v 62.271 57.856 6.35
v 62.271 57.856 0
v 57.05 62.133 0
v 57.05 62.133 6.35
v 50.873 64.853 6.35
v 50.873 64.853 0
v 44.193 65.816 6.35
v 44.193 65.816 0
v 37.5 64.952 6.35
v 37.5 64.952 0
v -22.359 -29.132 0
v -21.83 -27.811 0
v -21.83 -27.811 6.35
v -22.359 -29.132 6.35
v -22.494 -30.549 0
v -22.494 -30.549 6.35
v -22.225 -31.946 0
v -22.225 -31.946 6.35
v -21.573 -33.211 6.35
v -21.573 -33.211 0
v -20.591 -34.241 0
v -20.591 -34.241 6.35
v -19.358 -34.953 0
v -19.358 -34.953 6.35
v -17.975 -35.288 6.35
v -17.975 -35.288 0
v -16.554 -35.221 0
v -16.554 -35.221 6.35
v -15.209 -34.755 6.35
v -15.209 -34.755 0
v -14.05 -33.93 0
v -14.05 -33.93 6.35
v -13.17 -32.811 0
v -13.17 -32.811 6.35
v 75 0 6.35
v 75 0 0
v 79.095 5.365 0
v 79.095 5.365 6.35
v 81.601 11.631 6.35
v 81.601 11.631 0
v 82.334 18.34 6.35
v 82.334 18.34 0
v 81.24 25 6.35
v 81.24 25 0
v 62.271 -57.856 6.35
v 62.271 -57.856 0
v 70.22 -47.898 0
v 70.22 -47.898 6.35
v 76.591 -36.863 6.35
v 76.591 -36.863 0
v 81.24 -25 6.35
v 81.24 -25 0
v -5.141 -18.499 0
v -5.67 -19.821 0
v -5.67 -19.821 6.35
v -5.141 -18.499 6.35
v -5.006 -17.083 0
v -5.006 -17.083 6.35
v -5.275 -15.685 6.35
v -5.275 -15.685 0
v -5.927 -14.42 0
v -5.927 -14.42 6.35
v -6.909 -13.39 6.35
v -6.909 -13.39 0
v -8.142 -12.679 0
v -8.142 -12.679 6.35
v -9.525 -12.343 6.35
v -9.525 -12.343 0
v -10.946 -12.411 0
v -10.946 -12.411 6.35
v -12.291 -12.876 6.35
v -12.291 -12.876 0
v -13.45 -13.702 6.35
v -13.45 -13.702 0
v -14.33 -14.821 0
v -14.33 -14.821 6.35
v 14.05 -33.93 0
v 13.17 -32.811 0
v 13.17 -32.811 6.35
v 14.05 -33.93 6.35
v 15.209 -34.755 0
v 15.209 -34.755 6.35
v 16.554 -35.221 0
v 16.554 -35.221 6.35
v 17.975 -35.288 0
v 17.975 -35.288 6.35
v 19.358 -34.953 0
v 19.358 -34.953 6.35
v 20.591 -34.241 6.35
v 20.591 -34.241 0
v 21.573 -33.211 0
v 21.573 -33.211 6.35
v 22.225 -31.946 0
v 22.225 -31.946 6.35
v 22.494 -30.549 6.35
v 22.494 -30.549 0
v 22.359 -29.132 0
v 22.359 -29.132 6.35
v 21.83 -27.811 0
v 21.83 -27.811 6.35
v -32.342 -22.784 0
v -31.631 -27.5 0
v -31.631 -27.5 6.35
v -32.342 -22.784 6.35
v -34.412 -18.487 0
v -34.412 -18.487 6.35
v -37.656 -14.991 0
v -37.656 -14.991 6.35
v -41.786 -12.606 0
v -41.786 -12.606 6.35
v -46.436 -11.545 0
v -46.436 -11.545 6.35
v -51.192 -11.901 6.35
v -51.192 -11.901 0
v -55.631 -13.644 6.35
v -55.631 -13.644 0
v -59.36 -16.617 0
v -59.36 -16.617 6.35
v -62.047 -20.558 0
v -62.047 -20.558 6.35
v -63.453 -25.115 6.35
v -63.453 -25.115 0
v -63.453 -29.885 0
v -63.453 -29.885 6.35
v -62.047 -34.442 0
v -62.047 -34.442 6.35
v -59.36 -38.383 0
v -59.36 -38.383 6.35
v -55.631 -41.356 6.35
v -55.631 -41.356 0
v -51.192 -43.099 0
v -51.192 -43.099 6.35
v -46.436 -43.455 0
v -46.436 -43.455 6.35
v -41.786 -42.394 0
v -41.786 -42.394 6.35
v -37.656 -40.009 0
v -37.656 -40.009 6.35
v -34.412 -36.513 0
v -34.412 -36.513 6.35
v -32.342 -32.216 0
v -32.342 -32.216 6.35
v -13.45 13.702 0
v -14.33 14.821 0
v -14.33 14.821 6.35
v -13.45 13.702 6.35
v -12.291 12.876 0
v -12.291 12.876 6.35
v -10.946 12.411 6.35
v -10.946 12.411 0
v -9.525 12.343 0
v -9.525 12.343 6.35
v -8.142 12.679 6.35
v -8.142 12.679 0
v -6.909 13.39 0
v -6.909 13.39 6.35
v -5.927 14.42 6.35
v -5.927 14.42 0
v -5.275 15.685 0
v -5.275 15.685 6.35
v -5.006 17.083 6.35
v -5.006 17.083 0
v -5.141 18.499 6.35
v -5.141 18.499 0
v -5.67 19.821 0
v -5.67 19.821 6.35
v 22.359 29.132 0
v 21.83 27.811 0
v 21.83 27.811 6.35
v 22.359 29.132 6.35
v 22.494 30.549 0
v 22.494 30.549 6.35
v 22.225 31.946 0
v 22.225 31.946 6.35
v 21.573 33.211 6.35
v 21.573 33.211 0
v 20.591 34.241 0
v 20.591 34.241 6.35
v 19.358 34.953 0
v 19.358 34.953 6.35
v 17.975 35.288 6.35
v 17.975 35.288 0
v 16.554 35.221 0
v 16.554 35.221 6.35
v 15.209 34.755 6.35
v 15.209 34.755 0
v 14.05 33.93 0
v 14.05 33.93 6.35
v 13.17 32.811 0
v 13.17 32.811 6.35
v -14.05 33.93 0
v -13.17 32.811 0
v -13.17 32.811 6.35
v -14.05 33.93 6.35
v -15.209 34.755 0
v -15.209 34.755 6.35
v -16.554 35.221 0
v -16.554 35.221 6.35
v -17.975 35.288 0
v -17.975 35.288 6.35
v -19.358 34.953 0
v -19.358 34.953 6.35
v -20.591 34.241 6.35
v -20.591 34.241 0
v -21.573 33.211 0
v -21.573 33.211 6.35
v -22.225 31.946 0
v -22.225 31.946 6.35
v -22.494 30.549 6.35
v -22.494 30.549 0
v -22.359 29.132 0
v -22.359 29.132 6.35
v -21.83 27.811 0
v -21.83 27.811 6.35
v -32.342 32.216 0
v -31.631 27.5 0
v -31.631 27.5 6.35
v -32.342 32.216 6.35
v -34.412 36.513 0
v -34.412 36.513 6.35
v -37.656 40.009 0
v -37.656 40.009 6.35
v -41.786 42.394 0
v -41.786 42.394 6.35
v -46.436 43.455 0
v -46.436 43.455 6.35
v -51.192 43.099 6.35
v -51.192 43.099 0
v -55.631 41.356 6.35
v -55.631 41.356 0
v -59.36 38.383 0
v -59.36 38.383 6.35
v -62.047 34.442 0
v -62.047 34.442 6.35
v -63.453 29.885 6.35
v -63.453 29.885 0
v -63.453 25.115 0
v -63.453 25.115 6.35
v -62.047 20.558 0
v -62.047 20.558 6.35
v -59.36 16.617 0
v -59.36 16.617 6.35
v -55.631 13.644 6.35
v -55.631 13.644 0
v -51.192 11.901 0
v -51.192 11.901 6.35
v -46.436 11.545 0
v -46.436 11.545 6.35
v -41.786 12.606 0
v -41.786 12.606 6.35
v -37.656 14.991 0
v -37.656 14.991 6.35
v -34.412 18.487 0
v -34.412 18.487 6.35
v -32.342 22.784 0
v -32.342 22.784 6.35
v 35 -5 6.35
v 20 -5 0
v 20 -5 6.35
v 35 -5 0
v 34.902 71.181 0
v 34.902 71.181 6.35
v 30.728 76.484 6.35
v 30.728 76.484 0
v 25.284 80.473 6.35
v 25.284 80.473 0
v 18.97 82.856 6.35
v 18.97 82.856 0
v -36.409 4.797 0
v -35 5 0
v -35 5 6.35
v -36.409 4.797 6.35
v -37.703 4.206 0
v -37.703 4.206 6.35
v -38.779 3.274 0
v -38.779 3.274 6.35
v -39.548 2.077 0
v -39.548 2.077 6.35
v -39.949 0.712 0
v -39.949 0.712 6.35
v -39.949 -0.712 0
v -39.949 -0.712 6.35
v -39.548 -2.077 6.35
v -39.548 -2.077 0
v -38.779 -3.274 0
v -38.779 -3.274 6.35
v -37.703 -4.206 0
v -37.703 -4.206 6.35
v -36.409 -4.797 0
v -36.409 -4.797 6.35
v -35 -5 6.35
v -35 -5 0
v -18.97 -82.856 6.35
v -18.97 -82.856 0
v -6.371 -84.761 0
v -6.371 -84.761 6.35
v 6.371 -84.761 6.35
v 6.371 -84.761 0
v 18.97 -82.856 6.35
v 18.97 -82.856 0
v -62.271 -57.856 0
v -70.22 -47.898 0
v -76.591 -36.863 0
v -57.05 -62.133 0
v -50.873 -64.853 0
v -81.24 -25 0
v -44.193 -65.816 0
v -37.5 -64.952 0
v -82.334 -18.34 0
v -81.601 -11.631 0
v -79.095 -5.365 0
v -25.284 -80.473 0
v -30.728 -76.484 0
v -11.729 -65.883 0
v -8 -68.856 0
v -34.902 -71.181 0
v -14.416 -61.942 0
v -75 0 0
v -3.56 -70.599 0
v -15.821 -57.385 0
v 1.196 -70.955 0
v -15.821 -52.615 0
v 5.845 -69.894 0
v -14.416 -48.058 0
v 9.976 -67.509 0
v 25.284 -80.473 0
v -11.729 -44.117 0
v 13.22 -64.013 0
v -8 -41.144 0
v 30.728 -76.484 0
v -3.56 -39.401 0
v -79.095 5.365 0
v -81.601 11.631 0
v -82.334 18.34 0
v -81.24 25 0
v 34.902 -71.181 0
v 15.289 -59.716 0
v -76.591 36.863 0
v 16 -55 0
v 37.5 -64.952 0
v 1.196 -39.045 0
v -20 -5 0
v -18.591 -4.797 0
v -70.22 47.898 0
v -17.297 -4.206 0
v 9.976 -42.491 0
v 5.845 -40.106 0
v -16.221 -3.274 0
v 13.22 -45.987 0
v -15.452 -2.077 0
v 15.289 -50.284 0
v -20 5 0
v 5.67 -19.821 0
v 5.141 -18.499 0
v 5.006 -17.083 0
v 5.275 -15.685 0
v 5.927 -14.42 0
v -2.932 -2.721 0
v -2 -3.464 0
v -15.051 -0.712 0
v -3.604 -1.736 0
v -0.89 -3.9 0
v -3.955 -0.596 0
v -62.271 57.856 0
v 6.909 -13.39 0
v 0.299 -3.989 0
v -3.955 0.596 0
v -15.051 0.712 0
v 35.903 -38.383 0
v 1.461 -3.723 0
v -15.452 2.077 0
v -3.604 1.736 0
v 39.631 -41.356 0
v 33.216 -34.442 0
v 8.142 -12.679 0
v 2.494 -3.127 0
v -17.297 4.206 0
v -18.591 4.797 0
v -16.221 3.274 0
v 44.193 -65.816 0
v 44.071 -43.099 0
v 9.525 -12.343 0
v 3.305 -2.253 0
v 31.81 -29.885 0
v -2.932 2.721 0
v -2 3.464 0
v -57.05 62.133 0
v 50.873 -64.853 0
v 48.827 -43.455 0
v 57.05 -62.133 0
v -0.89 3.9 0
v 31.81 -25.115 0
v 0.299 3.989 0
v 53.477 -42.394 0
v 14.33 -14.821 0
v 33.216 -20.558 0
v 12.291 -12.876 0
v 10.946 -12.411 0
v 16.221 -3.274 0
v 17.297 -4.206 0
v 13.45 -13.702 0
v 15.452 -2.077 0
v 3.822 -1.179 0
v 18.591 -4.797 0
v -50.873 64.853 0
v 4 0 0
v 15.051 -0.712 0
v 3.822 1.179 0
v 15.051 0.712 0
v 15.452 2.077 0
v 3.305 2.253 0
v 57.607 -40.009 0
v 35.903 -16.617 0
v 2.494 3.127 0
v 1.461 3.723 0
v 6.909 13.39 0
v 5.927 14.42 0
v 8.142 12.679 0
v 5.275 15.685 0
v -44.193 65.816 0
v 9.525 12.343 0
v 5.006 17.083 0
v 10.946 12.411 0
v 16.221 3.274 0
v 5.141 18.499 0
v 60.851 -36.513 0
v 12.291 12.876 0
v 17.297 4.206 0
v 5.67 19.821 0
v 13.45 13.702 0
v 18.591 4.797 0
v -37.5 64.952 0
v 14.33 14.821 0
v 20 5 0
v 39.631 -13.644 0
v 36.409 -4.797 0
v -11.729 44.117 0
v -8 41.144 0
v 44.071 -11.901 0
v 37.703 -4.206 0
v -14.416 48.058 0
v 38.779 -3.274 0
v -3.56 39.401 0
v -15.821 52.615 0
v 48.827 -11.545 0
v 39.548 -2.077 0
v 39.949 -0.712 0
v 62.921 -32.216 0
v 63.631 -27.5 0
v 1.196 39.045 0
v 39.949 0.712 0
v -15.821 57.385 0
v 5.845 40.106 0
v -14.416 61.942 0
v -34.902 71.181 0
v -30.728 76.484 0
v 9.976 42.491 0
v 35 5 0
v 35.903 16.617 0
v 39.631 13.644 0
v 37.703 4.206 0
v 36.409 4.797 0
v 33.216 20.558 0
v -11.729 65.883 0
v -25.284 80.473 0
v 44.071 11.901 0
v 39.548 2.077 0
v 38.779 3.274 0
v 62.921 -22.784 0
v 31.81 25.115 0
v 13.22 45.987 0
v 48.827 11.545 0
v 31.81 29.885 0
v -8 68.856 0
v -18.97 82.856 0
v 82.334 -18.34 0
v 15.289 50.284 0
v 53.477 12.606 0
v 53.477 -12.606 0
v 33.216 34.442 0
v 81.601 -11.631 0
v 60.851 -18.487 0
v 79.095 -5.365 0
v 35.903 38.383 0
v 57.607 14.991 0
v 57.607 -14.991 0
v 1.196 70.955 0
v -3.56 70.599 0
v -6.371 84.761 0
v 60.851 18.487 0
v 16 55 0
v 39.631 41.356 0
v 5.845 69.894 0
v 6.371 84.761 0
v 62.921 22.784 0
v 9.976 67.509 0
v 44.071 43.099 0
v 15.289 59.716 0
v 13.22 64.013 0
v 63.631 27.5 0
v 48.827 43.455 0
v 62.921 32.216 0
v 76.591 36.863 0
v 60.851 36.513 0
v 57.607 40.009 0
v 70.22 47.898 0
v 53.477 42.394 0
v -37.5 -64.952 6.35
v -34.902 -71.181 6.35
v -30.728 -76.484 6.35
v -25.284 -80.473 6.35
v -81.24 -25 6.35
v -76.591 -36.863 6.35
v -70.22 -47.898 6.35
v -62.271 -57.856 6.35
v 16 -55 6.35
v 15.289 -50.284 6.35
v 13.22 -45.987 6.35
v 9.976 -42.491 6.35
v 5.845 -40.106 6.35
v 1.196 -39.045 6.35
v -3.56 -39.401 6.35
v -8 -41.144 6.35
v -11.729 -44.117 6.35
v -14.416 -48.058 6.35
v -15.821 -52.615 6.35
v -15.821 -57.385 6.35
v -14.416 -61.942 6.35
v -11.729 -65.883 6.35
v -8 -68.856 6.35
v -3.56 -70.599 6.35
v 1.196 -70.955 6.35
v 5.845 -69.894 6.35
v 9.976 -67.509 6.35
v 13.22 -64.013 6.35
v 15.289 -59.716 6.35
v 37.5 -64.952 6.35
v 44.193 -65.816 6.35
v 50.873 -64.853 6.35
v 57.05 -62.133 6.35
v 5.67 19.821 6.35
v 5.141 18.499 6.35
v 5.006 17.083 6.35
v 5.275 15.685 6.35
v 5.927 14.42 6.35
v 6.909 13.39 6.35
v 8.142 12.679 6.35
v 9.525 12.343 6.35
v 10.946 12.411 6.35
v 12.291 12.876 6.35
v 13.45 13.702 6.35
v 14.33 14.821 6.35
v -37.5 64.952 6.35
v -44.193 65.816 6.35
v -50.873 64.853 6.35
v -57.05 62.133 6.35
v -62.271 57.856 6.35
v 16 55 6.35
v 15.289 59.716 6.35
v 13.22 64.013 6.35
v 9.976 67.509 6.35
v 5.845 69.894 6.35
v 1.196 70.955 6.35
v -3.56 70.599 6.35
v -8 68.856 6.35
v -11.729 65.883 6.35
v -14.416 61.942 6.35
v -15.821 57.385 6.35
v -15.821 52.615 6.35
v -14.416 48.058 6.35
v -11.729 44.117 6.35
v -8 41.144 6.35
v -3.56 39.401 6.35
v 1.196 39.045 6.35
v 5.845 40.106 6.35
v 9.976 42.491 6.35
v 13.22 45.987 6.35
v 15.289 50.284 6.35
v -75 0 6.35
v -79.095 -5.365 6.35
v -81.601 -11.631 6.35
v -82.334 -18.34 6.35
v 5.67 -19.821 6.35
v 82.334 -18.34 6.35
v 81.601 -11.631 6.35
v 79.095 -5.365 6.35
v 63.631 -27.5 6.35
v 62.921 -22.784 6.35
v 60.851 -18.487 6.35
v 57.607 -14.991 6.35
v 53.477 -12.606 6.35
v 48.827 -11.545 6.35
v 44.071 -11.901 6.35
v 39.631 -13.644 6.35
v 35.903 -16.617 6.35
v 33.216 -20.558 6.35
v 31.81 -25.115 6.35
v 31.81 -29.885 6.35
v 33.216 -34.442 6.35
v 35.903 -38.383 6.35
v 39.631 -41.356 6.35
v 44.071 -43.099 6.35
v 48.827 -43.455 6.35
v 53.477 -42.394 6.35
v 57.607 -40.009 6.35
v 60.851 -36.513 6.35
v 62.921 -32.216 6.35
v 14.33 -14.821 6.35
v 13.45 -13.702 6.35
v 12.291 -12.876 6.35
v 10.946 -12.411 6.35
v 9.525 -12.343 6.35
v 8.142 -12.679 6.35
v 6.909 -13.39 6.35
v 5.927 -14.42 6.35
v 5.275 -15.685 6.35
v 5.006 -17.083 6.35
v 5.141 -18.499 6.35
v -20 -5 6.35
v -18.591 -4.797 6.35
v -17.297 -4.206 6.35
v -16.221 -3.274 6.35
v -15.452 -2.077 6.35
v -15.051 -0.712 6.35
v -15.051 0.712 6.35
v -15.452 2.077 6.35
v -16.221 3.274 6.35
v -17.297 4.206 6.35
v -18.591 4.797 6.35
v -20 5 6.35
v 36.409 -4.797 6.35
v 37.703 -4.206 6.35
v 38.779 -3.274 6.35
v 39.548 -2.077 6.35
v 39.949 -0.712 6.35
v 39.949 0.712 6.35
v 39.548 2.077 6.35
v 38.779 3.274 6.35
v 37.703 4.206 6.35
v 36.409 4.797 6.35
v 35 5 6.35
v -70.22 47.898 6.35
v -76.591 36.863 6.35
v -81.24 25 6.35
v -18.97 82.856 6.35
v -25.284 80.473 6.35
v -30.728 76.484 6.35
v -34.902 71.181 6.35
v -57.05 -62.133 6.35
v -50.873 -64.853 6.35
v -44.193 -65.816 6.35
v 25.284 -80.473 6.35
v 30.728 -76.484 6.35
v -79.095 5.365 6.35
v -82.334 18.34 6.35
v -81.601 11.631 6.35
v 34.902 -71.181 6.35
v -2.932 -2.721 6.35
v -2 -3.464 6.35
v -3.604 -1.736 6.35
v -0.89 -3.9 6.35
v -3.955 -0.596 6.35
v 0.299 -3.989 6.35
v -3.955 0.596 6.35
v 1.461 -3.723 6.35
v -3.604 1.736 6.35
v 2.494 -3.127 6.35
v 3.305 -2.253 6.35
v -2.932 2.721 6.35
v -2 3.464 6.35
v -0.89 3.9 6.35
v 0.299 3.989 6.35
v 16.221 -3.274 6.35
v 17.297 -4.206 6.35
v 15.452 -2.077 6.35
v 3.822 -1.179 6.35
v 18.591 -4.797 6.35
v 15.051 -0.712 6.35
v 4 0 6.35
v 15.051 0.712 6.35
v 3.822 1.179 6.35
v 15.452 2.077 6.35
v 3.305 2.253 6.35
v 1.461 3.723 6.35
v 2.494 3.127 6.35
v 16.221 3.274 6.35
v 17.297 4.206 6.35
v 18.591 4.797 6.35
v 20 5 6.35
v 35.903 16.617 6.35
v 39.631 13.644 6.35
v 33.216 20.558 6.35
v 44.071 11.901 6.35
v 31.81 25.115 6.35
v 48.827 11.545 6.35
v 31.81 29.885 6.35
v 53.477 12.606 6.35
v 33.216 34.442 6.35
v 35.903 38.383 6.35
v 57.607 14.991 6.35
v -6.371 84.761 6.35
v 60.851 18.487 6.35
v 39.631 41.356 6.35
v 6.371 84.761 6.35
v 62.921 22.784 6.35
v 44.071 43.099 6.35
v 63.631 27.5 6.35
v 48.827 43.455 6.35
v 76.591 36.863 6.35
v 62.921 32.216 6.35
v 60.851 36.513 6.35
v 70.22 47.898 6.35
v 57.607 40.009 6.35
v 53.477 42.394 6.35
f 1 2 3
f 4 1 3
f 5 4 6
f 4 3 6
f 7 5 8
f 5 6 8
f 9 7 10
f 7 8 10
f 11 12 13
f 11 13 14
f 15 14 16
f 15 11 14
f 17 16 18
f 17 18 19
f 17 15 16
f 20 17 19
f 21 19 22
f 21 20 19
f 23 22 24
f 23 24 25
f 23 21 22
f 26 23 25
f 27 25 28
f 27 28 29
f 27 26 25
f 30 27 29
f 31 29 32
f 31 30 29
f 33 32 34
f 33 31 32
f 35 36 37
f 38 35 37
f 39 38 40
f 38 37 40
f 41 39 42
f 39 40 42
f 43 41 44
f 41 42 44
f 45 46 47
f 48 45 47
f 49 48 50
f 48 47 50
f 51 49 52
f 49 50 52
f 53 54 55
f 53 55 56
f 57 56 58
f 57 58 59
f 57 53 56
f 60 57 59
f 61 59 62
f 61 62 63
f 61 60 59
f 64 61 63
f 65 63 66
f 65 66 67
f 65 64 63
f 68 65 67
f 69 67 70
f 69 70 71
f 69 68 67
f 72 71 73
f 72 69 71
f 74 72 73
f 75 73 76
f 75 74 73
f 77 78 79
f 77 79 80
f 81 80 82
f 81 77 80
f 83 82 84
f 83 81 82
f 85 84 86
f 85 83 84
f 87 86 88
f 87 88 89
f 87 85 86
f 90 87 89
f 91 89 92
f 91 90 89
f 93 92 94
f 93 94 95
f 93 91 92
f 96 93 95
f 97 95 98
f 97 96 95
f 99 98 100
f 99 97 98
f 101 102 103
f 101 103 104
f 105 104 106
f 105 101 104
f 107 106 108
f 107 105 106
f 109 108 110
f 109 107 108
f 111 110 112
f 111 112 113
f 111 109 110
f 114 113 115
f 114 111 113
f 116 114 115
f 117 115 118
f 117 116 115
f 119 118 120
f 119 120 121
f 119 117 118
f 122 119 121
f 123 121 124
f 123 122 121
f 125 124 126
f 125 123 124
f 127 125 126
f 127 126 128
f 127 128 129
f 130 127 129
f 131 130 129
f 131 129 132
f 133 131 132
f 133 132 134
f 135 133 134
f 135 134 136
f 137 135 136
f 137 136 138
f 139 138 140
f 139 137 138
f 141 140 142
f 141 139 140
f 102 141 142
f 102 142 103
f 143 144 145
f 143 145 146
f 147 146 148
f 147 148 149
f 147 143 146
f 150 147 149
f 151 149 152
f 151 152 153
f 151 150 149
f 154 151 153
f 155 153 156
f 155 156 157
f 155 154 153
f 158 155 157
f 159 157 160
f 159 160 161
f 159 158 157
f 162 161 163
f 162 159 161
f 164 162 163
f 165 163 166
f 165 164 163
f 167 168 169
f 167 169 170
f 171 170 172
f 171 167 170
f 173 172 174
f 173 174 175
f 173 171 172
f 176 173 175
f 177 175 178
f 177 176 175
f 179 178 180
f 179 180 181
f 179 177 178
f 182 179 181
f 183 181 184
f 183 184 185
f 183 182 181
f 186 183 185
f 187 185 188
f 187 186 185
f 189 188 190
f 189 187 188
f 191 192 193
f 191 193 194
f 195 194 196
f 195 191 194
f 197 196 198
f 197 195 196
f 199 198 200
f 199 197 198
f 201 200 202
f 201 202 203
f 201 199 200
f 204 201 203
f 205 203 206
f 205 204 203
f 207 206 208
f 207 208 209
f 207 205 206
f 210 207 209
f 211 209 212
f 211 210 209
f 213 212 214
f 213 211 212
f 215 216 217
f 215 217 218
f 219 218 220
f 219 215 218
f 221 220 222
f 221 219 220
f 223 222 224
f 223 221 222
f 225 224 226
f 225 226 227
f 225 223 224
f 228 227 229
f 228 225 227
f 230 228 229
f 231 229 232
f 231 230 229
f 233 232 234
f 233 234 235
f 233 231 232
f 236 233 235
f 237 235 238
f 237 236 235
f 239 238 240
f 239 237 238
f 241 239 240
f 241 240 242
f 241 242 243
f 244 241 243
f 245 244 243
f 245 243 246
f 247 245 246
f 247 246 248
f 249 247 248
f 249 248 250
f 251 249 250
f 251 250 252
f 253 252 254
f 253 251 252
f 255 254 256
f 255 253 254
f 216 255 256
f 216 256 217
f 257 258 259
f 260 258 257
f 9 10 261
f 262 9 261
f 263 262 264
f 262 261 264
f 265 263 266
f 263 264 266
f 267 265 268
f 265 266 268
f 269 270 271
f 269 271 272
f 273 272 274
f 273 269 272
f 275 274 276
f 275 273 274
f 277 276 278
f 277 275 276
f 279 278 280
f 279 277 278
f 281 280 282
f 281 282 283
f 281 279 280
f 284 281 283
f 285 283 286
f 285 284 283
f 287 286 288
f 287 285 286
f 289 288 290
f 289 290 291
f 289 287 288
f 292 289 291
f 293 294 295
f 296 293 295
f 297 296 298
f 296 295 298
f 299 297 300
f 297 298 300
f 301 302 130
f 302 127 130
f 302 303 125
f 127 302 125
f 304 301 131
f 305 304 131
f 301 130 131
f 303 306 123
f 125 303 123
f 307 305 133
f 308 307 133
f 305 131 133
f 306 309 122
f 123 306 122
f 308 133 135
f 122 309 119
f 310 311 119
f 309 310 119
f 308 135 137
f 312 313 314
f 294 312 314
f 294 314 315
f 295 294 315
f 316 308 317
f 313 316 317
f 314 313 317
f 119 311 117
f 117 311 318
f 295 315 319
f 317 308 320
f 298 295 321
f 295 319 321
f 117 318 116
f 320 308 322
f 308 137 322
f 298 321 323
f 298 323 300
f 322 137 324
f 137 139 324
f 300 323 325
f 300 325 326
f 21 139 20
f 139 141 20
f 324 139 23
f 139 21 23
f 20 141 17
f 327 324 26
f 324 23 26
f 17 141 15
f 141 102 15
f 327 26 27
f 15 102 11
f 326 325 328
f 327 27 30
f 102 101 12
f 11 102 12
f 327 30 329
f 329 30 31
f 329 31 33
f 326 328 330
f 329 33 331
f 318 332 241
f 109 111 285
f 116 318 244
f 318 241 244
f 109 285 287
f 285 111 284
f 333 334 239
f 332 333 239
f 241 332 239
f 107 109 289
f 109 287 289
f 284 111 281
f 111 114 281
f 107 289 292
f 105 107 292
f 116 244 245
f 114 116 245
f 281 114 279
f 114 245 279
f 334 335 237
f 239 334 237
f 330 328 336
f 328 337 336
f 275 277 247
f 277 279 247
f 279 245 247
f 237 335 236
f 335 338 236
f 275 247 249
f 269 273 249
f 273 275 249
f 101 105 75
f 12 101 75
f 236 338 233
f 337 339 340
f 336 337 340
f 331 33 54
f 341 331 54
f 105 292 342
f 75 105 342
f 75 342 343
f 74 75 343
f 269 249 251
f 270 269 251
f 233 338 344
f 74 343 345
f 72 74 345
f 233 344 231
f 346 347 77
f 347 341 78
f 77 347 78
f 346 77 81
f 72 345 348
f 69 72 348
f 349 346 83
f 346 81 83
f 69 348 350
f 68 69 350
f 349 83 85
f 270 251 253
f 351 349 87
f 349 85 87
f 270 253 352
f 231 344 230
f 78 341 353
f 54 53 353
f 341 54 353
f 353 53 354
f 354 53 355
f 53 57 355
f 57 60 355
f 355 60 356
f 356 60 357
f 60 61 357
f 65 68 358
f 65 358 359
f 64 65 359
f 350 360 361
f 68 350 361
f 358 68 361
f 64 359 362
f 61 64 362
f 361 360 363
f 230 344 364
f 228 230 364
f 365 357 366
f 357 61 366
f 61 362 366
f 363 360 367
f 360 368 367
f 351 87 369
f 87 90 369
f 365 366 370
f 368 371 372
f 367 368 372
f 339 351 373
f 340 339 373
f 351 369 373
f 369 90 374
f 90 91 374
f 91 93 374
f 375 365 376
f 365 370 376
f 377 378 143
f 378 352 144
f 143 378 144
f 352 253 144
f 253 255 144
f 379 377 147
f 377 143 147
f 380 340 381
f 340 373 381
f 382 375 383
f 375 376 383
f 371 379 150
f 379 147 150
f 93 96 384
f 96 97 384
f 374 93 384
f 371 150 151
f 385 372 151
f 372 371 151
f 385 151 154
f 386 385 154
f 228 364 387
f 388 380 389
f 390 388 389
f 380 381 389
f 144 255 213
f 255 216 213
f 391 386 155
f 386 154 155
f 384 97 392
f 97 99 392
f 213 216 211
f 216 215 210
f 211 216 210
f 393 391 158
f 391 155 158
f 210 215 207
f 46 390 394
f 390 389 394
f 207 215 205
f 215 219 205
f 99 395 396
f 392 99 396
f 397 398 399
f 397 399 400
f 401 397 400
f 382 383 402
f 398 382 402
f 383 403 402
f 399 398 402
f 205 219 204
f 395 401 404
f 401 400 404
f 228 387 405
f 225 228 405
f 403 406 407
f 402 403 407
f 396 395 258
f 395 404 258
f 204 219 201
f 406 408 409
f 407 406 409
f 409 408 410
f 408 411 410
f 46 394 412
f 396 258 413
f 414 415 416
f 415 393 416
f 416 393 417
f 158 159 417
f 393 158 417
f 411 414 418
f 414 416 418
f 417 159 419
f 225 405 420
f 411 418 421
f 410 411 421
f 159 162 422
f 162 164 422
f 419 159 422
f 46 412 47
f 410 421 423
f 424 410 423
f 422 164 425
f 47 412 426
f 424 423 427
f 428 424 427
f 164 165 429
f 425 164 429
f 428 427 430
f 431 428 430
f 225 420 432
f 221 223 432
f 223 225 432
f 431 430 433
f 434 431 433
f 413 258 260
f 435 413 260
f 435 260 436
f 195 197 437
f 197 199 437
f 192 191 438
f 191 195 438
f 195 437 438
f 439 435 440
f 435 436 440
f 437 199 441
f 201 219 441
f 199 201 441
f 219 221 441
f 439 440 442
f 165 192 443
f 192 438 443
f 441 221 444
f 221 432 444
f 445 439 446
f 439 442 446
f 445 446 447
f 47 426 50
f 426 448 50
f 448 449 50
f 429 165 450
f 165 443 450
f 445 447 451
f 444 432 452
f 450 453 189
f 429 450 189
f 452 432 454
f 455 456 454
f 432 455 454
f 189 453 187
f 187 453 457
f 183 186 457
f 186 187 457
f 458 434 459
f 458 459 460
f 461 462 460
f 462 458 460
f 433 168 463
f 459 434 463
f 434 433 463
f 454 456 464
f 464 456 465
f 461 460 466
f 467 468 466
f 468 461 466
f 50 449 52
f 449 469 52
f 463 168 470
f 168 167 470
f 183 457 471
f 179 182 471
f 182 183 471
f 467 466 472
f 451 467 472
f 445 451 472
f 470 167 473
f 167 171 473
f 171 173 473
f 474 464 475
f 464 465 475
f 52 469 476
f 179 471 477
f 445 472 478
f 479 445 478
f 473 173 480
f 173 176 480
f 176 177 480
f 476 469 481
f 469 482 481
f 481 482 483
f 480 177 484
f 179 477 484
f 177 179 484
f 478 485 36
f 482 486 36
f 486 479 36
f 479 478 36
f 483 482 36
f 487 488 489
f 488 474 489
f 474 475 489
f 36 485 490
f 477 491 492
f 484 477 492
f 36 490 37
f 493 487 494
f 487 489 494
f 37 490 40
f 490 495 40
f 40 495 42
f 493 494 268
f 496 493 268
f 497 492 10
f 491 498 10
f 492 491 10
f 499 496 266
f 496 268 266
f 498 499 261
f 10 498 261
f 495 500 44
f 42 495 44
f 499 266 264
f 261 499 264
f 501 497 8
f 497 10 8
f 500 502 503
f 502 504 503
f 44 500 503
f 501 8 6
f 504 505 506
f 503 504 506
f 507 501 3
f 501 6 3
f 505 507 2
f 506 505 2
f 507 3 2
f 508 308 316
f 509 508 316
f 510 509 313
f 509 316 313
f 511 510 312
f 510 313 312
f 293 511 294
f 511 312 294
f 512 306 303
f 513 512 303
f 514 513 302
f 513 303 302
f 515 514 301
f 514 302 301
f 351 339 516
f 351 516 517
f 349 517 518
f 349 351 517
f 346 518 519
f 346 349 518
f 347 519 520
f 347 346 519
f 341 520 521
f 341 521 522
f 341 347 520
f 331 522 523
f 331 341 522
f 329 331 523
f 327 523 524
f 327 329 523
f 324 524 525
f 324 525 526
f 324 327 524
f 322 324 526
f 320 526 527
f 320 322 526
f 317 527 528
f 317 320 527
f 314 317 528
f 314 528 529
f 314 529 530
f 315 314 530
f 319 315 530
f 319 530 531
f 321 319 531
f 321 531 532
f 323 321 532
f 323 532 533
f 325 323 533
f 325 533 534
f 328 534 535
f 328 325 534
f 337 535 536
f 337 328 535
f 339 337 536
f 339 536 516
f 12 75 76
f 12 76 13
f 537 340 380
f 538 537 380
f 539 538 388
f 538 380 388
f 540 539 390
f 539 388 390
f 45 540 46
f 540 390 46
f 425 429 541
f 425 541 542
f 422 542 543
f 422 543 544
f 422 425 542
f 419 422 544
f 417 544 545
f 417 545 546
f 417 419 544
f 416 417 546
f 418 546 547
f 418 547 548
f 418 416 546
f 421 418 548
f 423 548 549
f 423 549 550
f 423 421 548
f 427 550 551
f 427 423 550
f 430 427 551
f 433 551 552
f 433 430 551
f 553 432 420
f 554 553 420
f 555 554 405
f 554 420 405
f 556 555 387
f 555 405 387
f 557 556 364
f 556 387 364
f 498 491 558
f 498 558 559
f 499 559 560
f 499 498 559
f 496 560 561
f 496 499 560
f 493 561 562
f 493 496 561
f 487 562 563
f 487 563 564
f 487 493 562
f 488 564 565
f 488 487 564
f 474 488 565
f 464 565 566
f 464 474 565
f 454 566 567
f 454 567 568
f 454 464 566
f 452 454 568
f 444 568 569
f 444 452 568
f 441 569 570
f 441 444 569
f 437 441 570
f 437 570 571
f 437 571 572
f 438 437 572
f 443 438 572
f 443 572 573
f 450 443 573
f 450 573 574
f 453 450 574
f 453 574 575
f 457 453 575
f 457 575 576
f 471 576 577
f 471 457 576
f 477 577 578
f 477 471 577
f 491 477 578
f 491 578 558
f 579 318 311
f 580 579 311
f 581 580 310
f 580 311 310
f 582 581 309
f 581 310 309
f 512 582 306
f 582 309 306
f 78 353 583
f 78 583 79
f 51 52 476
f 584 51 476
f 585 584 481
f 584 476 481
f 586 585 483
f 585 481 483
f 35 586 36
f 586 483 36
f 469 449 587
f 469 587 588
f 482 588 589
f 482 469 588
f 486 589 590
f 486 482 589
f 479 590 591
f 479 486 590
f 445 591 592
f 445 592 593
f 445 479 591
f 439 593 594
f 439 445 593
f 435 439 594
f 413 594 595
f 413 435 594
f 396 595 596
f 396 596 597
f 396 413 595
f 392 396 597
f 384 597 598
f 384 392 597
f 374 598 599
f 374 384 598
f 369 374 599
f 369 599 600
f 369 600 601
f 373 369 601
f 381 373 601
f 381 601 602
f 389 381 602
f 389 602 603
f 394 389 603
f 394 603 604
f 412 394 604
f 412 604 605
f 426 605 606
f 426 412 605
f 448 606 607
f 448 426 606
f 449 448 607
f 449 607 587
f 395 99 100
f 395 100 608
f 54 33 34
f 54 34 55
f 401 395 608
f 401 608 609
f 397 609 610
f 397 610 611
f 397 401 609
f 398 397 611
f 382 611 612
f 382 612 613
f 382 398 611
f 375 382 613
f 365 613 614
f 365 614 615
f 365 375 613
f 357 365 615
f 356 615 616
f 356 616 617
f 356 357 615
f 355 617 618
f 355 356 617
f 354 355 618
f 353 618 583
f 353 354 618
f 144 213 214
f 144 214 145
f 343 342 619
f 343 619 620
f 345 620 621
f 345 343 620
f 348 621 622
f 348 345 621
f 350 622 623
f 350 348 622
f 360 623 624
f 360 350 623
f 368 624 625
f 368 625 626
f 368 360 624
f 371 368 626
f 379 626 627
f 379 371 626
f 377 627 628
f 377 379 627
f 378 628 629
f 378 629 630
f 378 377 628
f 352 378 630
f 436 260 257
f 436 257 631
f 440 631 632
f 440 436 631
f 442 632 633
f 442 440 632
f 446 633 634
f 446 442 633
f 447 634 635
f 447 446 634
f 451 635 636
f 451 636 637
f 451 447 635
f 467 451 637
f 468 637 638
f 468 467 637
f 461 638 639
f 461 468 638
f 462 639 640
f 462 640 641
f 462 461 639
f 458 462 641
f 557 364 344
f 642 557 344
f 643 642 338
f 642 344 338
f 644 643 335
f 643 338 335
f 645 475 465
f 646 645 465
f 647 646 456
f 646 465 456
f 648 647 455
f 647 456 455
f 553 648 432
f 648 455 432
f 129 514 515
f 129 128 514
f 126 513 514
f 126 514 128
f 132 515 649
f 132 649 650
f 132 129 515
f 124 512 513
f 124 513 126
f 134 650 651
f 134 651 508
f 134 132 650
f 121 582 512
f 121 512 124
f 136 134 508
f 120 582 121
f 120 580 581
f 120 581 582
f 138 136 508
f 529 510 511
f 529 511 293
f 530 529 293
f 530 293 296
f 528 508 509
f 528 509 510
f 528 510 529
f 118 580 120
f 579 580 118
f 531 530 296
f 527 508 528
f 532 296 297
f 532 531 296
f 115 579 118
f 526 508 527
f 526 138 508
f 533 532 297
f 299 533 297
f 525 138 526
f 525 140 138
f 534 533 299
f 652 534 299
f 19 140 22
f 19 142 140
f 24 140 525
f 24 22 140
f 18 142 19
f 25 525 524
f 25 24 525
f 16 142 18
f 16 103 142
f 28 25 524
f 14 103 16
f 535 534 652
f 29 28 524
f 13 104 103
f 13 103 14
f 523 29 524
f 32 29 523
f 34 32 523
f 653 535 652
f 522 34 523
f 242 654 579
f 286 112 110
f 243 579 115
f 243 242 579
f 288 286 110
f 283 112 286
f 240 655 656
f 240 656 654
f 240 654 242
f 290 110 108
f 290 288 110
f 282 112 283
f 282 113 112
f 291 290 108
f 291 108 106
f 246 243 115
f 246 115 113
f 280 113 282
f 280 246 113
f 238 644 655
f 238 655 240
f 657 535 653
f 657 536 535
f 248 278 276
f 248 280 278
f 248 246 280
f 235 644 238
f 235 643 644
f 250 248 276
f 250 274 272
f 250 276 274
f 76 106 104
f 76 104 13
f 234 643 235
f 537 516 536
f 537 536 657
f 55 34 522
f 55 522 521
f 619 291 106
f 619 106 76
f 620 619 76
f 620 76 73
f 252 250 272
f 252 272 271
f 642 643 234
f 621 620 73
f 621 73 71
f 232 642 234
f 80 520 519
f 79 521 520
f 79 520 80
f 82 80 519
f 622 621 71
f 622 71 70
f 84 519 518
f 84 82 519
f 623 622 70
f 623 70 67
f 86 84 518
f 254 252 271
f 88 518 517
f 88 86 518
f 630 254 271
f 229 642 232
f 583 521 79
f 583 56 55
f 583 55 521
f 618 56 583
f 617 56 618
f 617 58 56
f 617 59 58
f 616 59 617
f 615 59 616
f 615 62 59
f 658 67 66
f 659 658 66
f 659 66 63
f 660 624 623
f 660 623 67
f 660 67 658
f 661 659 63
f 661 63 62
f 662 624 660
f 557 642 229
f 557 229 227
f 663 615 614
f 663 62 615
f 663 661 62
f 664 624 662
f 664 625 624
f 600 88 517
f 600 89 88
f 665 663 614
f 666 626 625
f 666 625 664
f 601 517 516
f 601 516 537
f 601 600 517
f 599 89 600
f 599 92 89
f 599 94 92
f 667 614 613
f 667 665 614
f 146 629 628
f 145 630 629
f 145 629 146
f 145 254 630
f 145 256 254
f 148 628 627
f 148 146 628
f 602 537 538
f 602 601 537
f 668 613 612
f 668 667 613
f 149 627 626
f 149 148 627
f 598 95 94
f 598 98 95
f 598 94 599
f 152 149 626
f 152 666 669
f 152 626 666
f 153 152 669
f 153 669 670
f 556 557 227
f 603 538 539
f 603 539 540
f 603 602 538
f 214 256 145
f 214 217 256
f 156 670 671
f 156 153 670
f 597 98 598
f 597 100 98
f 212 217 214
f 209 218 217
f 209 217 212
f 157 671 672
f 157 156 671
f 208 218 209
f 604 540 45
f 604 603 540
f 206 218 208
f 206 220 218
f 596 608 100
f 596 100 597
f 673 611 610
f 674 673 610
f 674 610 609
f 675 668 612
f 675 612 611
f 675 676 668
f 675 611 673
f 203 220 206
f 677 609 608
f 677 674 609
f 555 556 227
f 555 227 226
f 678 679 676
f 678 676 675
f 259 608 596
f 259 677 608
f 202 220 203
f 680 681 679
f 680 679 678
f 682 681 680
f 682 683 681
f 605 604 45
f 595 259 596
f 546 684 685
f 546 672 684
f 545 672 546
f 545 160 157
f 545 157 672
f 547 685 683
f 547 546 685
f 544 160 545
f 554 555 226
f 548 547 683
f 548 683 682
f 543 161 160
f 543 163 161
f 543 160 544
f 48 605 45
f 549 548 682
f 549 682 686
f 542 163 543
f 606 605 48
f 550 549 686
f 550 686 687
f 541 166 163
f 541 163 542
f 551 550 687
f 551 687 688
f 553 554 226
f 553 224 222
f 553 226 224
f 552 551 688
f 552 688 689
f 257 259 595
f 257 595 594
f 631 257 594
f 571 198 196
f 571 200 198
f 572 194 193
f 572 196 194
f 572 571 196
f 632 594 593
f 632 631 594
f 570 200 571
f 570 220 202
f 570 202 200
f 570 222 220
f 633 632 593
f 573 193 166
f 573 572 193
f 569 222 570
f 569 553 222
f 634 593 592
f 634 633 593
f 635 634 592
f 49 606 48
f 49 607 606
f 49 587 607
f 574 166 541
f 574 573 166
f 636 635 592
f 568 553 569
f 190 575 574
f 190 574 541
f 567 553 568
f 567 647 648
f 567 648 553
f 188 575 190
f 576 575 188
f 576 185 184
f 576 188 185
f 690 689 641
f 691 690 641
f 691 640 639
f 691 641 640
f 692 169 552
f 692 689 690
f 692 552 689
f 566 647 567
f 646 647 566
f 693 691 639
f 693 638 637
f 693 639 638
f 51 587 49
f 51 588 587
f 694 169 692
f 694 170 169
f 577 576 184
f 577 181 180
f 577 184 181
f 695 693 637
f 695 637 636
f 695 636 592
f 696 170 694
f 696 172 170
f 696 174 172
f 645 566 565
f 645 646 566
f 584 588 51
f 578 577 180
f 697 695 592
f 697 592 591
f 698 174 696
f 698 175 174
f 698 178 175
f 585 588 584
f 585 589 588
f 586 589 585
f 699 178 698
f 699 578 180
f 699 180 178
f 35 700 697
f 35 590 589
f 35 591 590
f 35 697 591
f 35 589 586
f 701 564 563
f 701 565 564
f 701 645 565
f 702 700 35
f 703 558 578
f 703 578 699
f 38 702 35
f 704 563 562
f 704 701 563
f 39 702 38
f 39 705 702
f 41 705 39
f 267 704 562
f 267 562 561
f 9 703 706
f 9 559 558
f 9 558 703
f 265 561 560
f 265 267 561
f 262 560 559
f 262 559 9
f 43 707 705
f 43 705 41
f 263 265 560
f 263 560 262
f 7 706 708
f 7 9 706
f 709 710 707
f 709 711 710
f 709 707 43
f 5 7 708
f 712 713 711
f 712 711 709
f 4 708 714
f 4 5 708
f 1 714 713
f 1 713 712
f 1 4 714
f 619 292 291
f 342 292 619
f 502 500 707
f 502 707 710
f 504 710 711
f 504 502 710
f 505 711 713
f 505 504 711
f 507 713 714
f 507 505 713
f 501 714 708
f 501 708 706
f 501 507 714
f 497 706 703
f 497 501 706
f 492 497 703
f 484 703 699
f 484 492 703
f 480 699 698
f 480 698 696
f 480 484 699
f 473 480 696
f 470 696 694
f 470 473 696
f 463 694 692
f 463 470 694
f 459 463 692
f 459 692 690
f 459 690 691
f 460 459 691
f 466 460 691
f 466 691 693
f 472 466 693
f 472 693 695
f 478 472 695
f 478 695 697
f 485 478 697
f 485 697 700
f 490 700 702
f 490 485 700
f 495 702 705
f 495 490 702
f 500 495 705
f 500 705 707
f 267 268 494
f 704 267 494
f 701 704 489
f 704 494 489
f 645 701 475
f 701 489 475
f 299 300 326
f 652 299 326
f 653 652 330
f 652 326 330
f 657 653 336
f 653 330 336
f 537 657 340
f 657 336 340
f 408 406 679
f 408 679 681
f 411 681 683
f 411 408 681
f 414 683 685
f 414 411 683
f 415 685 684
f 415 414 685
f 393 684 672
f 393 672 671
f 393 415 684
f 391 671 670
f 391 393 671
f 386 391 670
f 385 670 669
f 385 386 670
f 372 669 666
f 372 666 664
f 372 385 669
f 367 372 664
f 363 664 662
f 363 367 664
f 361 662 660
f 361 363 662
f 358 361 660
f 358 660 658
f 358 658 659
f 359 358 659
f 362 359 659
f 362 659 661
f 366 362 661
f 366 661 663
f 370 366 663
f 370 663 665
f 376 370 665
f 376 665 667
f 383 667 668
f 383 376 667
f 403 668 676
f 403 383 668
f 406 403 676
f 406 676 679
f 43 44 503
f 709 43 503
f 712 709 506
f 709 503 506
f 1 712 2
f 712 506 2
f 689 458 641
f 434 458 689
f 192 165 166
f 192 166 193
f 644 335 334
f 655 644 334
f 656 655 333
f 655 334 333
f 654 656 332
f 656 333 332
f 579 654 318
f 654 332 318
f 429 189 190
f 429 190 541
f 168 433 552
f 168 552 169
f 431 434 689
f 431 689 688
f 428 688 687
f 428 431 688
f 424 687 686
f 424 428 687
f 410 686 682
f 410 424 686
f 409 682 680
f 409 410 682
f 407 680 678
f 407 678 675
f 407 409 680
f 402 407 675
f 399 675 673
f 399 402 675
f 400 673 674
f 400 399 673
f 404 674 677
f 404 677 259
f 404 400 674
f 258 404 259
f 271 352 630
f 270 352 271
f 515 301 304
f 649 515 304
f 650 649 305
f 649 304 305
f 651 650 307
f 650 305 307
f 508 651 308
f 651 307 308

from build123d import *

# Parameters (mm, degrees)
SKETCH_R   = 4
SKETCH_R_2 = 16
PAD_DEPTH  = 6.35


with BuildPart() as part:
    # Sketch → Pad (new body)
    with BuildSketch(Plane.XY):
        with BuildLine():
            ThreePointArc((-81.240384, 25), (-81.600865, 11.63117), (-75, 0))
            ThreePointArc((-75, 0), (-81.600865, -11.63117), (-81.240384, -25))
            ThreePointArc((-81.240384, -25), (-73.612159, -42.5), (-62.270827, -57.856236))
            ThreePointArc((-62.270827, -57.856236), (-50.873322, -64.852837), (-37.5, -64.951905))
            ThreePointArc((-37.5, -64.951905), (-30.727544, -76.484008), (-18.969557, -82.856236))
            ThreePointArc((-18.969557, -82.856236), (0, -85), (18.969557, -82.856236))
            ThreePointArc((18.969557, -82.856236), (30.727544, -76.484008), (37.5, -64.951905))
            ThreePointArc((37.5, -64.951905), (50.873322, -64.852837), (62.270827, -57.856236))
            ThreePointArc((62.270827, -57.856236), (73.612159, -42.5), (81.240384, -25))
            ThreePointArc((81.240384, -25), (81.600865, -11.63117), (75, 0))
            ThreePointArc((75, 0), (81.600865, 11.63117), (81.240384, 25))
            ThreePointArc((81.240384, 25), (73.612159, 42.5), (62.270827, 57.856236))
            ThreePointArc((62.270827, 57.856236), (50.873322, 64.852837), (37.5, 64.951905))
            ThreePointArc((37.5, 64.951905), (30.727544, 76.484008), (18.969557, 82.856236))
            ThreePointArc((18.969557, 82.856236), (0, 85), (-18.969557, 82.856236))
            ThreePointArc((-18.969557, 82.856236), (-30.727544, 76.484008), (-37.5, 64.951905))
            ThreePointArc((-37.5, 64.951905), (-50.873322, 64.852837), (-62.270827, 57.856236))
            ThreePointArc((-62.270827, 57.856236), (-73.612159, 42.5), (-81.240384, 25))
        make_face()
        Circle(SKETCH_R, mode=Mode.SUBTRACT)
        with Locations((-47.631397, -27.5)):
            Circle(SKETCH_R_2, mode=Mode.SUBTRACT)
        with Locations((47.631397, -27.5)):
            Circle(SKETCH_R_2, mode=Mode.SUBTRACT)
        with Locations((0, 55)):
            Circle(SKETCH_R_2, mode=Mode.SUBTRACT)
        with Locations((-47.631397, 27.5)):
            Circle(SKETCH_R_2, mode=Mode.SUBTRACT)
        with Locations((47.631397, 27.5)):
            Circle(SKETCH_R_2, mode=Mode.SUBTRACT)
        with Locations((0, -55)):
            Circle(SKETCH_R_2, mode=Mode.SUBTRACT)
        with BuildLine():
            ThreePointArc((-13.169873, 32.810889), (-20, 34.641016), (-21.830127, 27.810889))
            Line((-21.830127, 27.810889), (-14.330127, 14.820508))
            ThreePointArc((-14.330127, 14.820508), (-7.5, 12.990381), (-5.669873, 19.820508))
            Line((-5.669873, 19.820508), (-13.169873, 32.810889))
        make_face(mode=Mode.SUBTRACT)
        with BuildLine():
            ThreePointArc((21.830127, 27.810889), (20, 34.641016), (13.169873, 32.810889))
            Line((13.169873, 32.810889), (5.669873, 19.820508))
            ThreePointArc((5.669873, 19.820508), (7.5, 12.990381), (14.330127, 14.820508))
            Line((14.330127, 14.820508), (21.830127, 27.810889))
        make_face(mode=Mode.SUBTRACT)
        with BuildLine():
            ThreePointArc((35, -5), (40, 0), (35, 5))
            Line((35, 5), (20, 5))
            ThreePointArc((20, 5), (15, 0), (20, -5))
            Line((20, -5), (35, -5))
        make_face(mode=Mode.SUBTRACT)
        with BuildLine():
            ThreePointArc((14.330127, -14.820508), (7.5, -12.990381), (5.669873, -19.820508))
            Line((5.669873, -19.820508), (13.169873, -32.810889))
            ThreePointArc((13.169873, -32.810889), (20, -34.641016), (21.830127, -27.810889))
            Line((21.830127, -27.810889), (14.330127, -14.820508))
        make_face(mode=Mode.SUBTRACT)
        with BuildLine():
            ThreePointArc((-5.669873, -19.820508), (-7.5, -12.990381), (-14.330127, -14.820508))
            Line((-14.330127, -14.820508), (-21.830127, -27.810889))
            ThreePointArc((-21.830127, -27.810889), (-20, -34.641016), (-13.169873, -32.810889))
            Line((-13.169873, -32.810889), (-5.669873, -19.820508))
        make_face(mode=Mode.SUBTRACT)
        with BuildLine():
            ThreePointArc((-35, 5), (-40, 0), (-35, -5))
            Line((-35, -5), (-20, -5))
            ThreePointArc((-20, -5), (-15, 0), (-20, 5))
            Line((-20, 5), (-35, 5))
        make_face(mode=Mode.SUBTRACT)
    extrude(amount=PAD_DEPTH)


solid = part.part
